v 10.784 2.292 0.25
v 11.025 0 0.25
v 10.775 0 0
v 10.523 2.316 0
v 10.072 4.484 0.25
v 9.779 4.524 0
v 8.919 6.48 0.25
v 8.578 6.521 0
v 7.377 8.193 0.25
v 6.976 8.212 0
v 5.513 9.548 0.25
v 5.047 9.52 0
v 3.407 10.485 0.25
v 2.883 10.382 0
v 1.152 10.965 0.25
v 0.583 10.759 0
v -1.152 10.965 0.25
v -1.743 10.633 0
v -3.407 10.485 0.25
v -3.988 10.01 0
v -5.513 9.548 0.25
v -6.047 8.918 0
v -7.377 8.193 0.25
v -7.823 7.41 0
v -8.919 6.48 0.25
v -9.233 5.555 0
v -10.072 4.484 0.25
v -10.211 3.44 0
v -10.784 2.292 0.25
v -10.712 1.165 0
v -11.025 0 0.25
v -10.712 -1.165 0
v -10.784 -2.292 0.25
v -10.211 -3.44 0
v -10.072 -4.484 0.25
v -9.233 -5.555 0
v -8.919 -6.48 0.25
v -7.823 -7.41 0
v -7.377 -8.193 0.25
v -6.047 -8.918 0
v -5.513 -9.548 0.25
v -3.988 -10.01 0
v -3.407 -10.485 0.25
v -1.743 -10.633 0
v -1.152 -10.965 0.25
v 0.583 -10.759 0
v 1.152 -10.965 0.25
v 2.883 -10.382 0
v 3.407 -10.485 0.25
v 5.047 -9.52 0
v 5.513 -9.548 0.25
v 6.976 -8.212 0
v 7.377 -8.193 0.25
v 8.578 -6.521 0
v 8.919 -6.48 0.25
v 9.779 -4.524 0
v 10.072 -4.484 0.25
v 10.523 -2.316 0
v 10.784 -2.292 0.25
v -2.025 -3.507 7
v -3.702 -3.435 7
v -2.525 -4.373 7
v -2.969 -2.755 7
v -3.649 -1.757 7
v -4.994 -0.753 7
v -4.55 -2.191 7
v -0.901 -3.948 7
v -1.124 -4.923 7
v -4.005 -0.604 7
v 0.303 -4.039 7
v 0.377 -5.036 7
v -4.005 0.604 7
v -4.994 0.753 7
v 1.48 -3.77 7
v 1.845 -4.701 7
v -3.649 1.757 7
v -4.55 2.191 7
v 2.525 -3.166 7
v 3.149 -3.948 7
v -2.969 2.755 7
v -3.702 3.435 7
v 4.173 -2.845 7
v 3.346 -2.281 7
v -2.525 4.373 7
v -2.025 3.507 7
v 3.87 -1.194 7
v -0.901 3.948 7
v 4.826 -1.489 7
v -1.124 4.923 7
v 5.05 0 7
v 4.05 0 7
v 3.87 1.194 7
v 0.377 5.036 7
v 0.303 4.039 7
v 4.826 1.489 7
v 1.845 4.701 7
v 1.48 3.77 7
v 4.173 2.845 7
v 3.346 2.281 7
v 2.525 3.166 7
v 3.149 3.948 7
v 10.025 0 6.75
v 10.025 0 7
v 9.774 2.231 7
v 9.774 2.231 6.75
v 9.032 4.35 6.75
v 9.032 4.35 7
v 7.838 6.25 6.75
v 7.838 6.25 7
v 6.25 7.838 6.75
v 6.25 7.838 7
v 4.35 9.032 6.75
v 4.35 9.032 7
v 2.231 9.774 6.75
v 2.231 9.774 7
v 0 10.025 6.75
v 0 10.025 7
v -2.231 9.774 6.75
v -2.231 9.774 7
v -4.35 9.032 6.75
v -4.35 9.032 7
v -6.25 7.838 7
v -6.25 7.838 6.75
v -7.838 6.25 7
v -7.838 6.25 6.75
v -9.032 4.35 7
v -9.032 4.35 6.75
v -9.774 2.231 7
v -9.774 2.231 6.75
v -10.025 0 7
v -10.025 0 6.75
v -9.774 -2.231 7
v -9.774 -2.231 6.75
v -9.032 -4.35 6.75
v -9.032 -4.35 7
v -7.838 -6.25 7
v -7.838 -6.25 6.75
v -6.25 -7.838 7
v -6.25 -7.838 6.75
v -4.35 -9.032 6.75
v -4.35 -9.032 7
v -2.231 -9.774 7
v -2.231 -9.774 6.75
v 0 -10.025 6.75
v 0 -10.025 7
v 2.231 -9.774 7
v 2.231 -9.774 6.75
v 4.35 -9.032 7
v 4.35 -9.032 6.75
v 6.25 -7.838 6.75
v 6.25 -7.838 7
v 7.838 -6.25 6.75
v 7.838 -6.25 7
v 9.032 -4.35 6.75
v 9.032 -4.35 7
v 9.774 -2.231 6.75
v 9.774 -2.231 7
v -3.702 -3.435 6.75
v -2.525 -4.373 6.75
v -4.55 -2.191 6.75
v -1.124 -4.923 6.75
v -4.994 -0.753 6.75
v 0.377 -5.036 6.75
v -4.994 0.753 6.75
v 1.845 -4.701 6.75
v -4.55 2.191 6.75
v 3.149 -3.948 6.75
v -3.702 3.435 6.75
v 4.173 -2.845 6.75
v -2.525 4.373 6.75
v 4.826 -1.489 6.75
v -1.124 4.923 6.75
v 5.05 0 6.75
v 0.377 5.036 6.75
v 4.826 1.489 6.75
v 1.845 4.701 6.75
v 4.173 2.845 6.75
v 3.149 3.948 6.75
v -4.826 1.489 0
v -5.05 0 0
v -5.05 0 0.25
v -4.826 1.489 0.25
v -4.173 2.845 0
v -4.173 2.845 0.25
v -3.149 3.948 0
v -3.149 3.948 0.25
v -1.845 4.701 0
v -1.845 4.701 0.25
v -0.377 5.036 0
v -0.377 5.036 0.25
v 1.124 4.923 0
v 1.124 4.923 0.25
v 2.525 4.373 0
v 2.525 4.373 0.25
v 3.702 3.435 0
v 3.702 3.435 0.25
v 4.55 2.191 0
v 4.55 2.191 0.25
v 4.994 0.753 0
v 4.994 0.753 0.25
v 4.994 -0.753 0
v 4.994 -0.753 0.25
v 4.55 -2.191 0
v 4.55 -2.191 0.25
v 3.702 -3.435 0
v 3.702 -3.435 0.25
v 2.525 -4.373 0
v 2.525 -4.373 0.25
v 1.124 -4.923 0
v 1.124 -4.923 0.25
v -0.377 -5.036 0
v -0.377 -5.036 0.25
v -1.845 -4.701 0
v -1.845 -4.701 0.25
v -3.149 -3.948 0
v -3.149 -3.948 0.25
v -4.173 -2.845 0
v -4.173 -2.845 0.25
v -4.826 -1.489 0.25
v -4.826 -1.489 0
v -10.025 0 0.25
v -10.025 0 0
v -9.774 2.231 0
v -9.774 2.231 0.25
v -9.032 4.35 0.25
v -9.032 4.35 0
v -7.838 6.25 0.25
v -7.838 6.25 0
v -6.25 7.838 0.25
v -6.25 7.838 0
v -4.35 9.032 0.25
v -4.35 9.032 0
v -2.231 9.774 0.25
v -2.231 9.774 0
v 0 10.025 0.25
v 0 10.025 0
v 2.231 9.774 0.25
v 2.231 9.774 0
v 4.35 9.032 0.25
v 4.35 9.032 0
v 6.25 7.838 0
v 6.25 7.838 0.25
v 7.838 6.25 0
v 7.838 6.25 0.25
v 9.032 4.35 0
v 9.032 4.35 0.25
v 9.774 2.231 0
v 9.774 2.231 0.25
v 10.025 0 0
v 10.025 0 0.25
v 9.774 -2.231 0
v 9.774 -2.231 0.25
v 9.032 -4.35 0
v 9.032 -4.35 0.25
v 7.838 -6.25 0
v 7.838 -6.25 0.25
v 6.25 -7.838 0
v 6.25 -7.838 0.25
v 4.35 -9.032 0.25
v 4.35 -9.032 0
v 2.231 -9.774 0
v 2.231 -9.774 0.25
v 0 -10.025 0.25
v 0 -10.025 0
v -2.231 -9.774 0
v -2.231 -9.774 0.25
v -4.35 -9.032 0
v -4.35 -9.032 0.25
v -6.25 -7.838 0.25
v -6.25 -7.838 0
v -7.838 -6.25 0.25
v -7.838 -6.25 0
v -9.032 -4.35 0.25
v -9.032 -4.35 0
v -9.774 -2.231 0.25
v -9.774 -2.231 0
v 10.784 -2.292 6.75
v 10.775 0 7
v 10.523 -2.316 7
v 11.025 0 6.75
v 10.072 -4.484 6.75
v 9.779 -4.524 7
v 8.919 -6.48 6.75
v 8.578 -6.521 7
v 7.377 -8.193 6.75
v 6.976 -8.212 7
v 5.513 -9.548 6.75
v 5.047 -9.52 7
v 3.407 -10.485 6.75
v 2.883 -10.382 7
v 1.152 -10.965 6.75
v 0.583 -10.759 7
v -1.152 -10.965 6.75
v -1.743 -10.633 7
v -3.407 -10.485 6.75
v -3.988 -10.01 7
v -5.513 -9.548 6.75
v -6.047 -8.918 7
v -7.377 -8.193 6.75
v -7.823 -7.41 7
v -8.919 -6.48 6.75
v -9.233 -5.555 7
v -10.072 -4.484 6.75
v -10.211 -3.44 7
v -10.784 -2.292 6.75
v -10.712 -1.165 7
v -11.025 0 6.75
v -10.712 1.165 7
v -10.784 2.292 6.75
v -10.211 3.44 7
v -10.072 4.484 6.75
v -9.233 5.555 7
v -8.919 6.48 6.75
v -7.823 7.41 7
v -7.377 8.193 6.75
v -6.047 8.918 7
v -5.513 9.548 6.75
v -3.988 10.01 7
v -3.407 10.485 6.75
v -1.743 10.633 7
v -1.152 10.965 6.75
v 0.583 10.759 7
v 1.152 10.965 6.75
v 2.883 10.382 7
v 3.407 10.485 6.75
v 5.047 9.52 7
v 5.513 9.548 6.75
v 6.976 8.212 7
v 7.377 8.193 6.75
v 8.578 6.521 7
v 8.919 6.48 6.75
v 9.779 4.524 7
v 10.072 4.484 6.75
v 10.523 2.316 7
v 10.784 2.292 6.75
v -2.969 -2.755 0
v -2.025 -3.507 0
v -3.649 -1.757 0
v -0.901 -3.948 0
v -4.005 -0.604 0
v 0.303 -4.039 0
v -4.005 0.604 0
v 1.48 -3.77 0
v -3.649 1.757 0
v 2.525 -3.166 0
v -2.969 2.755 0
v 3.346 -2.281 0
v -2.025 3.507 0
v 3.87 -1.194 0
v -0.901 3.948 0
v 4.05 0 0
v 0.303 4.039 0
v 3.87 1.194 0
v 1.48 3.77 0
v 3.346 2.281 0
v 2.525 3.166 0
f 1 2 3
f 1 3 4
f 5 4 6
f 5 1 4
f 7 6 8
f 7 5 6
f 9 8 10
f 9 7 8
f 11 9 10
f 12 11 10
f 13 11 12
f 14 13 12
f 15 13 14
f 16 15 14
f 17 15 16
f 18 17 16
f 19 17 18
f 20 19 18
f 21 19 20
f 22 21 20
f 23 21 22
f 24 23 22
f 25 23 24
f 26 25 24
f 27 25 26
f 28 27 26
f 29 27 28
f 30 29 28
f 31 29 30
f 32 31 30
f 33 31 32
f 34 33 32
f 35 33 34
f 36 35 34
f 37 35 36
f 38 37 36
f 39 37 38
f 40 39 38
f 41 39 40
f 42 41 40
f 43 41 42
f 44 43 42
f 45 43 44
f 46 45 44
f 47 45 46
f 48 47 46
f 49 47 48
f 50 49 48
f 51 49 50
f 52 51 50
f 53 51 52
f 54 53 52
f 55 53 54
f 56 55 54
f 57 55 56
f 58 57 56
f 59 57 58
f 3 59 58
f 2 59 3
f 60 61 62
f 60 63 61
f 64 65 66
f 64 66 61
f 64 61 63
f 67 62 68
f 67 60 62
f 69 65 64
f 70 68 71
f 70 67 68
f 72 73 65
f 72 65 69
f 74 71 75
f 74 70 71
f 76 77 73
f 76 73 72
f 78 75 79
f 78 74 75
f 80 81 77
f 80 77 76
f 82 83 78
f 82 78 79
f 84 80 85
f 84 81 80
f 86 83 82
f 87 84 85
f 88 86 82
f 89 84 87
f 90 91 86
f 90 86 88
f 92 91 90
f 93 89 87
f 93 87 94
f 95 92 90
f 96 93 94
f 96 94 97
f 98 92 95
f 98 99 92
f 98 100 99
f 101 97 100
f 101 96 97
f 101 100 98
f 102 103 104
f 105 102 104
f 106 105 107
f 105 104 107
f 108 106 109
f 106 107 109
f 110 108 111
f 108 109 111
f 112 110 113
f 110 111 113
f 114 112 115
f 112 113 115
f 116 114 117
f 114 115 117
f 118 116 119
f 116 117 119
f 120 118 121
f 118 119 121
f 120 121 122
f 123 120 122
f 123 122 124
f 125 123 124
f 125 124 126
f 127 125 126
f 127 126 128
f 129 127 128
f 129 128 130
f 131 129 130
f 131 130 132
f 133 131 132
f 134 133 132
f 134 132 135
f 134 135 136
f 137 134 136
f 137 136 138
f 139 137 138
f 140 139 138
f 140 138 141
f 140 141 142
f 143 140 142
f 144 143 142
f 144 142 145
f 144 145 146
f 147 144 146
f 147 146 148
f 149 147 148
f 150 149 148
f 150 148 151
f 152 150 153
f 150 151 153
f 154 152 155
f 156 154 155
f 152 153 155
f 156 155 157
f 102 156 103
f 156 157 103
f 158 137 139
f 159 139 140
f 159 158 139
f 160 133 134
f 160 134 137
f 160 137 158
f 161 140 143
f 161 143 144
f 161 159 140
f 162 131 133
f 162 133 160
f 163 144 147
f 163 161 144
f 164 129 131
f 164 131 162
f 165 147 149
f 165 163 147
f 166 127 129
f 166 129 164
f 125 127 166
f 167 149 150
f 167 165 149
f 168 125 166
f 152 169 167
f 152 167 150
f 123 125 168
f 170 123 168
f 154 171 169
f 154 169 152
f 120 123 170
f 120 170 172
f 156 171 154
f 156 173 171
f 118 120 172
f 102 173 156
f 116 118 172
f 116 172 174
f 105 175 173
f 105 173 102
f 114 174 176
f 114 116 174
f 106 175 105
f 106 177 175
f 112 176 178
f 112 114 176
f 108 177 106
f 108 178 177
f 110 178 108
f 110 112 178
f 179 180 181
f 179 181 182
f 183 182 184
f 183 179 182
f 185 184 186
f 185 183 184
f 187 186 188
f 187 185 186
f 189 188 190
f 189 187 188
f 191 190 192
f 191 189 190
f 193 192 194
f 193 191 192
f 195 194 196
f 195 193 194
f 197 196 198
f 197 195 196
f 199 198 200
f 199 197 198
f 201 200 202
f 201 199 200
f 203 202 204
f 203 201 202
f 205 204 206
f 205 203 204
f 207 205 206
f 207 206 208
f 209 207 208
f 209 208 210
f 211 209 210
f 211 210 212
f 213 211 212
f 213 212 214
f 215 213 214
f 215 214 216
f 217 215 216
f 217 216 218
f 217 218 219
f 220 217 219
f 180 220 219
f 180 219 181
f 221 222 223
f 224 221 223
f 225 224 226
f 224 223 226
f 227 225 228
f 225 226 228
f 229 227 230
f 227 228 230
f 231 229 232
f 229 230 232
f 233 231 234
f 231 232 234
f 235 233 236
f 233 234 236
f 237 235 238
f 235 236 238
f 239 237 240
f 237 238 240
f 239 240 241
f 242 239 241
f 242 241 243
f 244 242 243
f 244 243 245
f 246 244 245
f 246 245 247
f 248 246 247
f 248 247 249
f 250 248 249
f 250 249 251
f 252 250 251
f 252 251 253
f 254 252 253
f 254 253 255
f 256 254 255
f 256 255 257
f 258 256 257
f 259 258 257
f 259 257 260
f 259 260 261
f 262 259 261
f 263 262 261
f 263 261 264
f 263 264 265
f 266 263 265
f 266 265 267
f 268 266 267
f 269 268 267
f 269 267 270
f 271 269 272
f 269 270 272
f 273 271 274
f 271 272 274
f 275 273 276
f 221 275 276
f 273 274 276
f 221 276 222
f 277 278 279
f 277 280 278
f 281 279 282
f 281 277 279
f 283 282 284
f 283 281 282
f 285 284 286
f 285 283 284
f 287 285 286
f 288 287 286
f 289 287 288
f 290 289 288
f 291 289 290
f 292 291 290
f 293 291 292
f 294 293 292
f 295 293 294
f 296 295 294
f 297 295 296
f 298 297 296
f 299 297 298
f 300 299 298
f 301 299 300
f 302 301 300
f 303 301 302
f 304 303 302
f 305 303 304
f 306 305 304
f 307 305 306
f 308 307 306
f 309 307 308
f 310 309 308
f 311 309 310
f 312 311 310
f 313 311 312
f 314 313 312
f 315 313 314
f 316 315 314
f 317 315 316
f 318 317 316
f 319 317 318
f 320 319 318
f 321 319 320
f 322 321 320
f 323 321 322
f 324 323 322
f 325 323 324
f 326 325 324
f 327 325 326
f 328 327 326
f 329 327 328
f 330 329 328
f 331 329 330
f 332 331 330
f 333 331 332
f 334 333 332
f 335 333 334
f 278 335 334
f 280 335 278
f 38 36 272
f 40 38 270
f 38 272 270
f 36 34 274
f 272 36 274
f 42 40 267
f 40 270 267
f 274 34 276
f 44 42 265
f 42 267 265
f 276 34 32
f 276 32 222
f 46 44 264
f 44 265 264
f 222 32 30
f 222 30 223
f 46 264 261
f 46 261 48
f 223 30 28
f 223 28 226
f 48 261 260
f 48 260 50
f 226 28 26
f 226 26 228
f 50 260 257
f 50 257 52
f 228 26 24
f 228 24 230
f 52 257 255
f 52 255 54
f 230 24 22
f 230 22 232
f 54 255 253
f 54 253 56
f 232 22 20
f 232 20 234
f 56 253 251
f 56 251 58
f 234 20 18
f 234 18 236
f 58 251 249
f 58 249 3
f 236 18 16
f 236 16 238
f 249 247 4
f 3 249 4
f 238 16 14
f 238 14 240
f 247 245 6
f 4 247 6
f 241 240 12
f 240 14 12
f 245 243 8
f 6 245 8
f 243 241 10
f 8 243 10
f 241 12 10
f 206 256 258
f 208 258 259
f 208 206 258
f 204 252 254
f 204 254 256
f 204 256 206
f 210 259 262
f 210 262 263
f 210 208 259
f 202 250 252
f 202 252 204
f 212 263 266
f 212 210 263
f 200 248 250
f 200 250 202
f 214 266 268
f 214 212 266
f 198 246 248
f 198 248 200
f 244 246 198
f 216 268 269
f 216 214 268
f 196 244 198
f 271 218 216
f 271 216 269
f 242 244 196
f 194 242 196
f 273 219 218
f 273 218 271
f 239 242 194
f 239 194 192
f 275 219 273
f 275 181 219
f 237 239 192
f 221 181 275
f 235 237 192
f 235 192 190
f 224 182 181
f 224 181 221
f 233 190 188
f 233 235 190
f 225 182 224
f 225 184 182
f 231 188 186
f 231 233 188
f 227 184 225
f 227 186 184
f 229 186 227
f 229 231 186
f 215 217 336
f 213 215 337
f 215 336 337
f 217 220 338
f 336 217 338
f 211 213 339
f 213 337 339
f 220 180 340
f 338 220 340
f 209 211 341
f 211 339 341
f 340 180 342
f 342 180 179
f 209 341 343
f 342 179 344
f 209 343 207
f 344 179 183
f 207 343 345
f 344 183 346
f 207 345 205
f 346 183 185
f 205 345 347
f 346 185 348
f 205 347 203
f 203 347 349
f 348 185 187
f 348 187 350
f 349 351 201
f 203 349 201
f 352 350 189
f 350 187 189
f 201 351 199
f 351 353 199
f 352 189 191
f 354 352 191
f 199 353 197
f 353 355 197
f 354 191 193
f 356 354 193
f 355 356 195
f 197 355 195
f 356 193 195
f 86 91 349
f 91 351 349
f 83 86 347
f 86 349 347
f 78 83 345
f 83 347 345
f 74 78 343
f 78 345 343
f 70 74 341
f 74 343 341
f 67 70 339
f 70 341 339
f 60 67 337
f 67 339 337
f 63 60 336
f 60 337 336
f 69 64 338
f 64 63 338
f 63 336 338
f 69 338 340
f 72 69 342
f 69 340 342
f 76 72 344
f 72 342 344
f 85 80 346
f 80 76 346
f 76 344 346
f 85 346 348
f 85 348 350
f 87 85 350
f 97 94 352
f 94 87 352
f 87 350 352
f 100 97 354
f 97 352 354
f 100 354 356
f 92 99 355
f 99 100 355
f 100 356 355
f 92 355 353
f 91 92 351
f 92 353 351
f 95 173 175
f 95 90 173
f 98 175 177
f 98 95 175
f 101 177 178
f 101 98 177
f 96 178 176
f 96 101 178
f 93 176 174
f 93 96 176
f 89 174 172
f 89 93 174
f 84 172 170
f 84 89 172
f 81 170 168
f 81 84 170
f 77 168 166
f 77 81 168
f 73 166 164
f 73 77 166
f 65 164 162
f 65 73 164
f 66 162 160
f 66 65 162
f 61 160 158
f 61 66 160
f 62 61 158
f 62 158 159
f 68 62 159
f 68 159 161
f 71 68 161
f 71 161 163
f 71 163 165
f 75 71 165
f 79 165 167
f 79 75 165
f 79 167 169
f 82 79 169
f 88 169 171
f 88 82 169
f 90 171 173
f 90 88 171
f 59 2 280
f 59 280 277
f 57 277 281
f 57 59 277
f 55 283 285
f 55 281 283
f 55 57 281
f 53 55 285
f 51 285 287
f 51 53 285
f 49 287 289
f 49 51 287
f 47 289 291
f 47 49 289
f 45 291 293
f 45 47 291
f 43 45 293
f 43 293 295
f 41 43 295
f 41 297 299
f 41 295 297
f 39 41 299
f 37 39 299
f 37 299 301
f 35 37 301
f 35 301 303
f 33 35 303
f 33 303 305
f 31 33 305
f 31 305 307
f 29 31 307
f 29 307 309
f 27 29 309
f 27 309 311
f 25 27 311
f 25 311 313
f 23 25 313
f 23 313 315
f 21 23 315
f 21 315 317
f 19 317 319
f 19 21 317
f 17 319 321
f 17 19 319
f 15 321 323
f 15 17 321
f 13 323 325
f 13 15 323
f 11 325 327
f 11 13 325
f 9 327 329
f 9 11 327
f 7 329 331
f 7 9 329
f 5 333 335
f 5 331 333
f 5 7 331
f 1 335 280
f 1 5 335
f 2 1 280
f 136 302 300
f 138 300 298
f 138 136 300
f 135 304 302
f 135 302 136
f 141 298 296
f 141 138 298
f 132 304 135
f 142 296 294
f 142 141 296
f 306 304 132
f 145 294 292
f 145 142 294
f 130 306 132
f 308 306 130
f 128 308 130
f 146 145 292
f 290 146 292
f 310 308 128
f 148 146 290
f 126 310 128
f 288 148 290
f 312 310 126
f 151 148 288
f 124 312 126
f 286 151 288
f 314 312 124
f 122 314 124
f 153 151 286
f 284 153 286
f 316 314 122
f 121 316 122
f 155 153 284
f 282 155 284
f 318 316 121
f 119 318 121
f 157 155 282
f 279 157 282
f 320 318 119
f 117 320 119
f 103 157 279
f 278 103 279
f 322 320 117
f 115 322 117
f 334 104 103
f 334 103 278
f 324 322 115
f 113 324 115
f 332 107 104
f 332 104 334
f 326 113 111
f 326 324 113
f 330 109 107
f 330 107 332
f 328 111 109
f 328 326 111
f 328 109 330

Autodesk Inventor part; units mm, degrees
ref_plane "YZ Plane" through (0, 0, 0) normal (1, 0, 0) x (0, 1, 0)
ref_plane "XZ Plane" through (0, 0, 0) normal (0, 1, 0) x (-1, 0, 0)
ref_plane "XY Plane" through (0, 0, 0) normal (0, 0, 1) x (1, 0, 0)
sketch "Sketch1" plane through (0, 0, 0) normal (0, 0, 1) x (1, 0, 0)
  circle A0 centre (0, 0) radius 11.025
  circle A1 centre (0, 0) radius 4.05
  dimension "d0" = 22.05
  dimension "d1" = 8.1
extrude "Extrusion1" add sketch "Sketch1" along normal blind 7
sketch "Sketch2" plane through (0, 0, 7) normal (0, 0, 1) x (1, 0, 0)
  circle A0 centre (0, 0) radius 5.05
  circle A1 centre (0, 0) radius 10.025
  circle A2 centre (0, 0) radius 11.025 projected
  circle A3 centre (0, 0) radius 4.05 projected
  dimension "d4" = 1
  dimension "d5" = 1
extrude "Extrusion2" cut sketch "Sketch2" against normal blind 0.25 contours A1
sketch "Sketch3" plane through (0, 0, 0) normal (0, 0, -1) x (-1, 0, 0)
  circle A0 centre (0, 0) radius 10.025 projected
  circle A1 centre (0, 0) radius 5.05 projected
extrude "Extrusion3" cut sketch "Sketch3" against normal blind 0.25
chamfer "Chamfer1" distance 0.25 angle 45 2 edges at (-11.025, 0, 7) (-11.025, 0, 0)
properties part number "bearing_22x8x7"
